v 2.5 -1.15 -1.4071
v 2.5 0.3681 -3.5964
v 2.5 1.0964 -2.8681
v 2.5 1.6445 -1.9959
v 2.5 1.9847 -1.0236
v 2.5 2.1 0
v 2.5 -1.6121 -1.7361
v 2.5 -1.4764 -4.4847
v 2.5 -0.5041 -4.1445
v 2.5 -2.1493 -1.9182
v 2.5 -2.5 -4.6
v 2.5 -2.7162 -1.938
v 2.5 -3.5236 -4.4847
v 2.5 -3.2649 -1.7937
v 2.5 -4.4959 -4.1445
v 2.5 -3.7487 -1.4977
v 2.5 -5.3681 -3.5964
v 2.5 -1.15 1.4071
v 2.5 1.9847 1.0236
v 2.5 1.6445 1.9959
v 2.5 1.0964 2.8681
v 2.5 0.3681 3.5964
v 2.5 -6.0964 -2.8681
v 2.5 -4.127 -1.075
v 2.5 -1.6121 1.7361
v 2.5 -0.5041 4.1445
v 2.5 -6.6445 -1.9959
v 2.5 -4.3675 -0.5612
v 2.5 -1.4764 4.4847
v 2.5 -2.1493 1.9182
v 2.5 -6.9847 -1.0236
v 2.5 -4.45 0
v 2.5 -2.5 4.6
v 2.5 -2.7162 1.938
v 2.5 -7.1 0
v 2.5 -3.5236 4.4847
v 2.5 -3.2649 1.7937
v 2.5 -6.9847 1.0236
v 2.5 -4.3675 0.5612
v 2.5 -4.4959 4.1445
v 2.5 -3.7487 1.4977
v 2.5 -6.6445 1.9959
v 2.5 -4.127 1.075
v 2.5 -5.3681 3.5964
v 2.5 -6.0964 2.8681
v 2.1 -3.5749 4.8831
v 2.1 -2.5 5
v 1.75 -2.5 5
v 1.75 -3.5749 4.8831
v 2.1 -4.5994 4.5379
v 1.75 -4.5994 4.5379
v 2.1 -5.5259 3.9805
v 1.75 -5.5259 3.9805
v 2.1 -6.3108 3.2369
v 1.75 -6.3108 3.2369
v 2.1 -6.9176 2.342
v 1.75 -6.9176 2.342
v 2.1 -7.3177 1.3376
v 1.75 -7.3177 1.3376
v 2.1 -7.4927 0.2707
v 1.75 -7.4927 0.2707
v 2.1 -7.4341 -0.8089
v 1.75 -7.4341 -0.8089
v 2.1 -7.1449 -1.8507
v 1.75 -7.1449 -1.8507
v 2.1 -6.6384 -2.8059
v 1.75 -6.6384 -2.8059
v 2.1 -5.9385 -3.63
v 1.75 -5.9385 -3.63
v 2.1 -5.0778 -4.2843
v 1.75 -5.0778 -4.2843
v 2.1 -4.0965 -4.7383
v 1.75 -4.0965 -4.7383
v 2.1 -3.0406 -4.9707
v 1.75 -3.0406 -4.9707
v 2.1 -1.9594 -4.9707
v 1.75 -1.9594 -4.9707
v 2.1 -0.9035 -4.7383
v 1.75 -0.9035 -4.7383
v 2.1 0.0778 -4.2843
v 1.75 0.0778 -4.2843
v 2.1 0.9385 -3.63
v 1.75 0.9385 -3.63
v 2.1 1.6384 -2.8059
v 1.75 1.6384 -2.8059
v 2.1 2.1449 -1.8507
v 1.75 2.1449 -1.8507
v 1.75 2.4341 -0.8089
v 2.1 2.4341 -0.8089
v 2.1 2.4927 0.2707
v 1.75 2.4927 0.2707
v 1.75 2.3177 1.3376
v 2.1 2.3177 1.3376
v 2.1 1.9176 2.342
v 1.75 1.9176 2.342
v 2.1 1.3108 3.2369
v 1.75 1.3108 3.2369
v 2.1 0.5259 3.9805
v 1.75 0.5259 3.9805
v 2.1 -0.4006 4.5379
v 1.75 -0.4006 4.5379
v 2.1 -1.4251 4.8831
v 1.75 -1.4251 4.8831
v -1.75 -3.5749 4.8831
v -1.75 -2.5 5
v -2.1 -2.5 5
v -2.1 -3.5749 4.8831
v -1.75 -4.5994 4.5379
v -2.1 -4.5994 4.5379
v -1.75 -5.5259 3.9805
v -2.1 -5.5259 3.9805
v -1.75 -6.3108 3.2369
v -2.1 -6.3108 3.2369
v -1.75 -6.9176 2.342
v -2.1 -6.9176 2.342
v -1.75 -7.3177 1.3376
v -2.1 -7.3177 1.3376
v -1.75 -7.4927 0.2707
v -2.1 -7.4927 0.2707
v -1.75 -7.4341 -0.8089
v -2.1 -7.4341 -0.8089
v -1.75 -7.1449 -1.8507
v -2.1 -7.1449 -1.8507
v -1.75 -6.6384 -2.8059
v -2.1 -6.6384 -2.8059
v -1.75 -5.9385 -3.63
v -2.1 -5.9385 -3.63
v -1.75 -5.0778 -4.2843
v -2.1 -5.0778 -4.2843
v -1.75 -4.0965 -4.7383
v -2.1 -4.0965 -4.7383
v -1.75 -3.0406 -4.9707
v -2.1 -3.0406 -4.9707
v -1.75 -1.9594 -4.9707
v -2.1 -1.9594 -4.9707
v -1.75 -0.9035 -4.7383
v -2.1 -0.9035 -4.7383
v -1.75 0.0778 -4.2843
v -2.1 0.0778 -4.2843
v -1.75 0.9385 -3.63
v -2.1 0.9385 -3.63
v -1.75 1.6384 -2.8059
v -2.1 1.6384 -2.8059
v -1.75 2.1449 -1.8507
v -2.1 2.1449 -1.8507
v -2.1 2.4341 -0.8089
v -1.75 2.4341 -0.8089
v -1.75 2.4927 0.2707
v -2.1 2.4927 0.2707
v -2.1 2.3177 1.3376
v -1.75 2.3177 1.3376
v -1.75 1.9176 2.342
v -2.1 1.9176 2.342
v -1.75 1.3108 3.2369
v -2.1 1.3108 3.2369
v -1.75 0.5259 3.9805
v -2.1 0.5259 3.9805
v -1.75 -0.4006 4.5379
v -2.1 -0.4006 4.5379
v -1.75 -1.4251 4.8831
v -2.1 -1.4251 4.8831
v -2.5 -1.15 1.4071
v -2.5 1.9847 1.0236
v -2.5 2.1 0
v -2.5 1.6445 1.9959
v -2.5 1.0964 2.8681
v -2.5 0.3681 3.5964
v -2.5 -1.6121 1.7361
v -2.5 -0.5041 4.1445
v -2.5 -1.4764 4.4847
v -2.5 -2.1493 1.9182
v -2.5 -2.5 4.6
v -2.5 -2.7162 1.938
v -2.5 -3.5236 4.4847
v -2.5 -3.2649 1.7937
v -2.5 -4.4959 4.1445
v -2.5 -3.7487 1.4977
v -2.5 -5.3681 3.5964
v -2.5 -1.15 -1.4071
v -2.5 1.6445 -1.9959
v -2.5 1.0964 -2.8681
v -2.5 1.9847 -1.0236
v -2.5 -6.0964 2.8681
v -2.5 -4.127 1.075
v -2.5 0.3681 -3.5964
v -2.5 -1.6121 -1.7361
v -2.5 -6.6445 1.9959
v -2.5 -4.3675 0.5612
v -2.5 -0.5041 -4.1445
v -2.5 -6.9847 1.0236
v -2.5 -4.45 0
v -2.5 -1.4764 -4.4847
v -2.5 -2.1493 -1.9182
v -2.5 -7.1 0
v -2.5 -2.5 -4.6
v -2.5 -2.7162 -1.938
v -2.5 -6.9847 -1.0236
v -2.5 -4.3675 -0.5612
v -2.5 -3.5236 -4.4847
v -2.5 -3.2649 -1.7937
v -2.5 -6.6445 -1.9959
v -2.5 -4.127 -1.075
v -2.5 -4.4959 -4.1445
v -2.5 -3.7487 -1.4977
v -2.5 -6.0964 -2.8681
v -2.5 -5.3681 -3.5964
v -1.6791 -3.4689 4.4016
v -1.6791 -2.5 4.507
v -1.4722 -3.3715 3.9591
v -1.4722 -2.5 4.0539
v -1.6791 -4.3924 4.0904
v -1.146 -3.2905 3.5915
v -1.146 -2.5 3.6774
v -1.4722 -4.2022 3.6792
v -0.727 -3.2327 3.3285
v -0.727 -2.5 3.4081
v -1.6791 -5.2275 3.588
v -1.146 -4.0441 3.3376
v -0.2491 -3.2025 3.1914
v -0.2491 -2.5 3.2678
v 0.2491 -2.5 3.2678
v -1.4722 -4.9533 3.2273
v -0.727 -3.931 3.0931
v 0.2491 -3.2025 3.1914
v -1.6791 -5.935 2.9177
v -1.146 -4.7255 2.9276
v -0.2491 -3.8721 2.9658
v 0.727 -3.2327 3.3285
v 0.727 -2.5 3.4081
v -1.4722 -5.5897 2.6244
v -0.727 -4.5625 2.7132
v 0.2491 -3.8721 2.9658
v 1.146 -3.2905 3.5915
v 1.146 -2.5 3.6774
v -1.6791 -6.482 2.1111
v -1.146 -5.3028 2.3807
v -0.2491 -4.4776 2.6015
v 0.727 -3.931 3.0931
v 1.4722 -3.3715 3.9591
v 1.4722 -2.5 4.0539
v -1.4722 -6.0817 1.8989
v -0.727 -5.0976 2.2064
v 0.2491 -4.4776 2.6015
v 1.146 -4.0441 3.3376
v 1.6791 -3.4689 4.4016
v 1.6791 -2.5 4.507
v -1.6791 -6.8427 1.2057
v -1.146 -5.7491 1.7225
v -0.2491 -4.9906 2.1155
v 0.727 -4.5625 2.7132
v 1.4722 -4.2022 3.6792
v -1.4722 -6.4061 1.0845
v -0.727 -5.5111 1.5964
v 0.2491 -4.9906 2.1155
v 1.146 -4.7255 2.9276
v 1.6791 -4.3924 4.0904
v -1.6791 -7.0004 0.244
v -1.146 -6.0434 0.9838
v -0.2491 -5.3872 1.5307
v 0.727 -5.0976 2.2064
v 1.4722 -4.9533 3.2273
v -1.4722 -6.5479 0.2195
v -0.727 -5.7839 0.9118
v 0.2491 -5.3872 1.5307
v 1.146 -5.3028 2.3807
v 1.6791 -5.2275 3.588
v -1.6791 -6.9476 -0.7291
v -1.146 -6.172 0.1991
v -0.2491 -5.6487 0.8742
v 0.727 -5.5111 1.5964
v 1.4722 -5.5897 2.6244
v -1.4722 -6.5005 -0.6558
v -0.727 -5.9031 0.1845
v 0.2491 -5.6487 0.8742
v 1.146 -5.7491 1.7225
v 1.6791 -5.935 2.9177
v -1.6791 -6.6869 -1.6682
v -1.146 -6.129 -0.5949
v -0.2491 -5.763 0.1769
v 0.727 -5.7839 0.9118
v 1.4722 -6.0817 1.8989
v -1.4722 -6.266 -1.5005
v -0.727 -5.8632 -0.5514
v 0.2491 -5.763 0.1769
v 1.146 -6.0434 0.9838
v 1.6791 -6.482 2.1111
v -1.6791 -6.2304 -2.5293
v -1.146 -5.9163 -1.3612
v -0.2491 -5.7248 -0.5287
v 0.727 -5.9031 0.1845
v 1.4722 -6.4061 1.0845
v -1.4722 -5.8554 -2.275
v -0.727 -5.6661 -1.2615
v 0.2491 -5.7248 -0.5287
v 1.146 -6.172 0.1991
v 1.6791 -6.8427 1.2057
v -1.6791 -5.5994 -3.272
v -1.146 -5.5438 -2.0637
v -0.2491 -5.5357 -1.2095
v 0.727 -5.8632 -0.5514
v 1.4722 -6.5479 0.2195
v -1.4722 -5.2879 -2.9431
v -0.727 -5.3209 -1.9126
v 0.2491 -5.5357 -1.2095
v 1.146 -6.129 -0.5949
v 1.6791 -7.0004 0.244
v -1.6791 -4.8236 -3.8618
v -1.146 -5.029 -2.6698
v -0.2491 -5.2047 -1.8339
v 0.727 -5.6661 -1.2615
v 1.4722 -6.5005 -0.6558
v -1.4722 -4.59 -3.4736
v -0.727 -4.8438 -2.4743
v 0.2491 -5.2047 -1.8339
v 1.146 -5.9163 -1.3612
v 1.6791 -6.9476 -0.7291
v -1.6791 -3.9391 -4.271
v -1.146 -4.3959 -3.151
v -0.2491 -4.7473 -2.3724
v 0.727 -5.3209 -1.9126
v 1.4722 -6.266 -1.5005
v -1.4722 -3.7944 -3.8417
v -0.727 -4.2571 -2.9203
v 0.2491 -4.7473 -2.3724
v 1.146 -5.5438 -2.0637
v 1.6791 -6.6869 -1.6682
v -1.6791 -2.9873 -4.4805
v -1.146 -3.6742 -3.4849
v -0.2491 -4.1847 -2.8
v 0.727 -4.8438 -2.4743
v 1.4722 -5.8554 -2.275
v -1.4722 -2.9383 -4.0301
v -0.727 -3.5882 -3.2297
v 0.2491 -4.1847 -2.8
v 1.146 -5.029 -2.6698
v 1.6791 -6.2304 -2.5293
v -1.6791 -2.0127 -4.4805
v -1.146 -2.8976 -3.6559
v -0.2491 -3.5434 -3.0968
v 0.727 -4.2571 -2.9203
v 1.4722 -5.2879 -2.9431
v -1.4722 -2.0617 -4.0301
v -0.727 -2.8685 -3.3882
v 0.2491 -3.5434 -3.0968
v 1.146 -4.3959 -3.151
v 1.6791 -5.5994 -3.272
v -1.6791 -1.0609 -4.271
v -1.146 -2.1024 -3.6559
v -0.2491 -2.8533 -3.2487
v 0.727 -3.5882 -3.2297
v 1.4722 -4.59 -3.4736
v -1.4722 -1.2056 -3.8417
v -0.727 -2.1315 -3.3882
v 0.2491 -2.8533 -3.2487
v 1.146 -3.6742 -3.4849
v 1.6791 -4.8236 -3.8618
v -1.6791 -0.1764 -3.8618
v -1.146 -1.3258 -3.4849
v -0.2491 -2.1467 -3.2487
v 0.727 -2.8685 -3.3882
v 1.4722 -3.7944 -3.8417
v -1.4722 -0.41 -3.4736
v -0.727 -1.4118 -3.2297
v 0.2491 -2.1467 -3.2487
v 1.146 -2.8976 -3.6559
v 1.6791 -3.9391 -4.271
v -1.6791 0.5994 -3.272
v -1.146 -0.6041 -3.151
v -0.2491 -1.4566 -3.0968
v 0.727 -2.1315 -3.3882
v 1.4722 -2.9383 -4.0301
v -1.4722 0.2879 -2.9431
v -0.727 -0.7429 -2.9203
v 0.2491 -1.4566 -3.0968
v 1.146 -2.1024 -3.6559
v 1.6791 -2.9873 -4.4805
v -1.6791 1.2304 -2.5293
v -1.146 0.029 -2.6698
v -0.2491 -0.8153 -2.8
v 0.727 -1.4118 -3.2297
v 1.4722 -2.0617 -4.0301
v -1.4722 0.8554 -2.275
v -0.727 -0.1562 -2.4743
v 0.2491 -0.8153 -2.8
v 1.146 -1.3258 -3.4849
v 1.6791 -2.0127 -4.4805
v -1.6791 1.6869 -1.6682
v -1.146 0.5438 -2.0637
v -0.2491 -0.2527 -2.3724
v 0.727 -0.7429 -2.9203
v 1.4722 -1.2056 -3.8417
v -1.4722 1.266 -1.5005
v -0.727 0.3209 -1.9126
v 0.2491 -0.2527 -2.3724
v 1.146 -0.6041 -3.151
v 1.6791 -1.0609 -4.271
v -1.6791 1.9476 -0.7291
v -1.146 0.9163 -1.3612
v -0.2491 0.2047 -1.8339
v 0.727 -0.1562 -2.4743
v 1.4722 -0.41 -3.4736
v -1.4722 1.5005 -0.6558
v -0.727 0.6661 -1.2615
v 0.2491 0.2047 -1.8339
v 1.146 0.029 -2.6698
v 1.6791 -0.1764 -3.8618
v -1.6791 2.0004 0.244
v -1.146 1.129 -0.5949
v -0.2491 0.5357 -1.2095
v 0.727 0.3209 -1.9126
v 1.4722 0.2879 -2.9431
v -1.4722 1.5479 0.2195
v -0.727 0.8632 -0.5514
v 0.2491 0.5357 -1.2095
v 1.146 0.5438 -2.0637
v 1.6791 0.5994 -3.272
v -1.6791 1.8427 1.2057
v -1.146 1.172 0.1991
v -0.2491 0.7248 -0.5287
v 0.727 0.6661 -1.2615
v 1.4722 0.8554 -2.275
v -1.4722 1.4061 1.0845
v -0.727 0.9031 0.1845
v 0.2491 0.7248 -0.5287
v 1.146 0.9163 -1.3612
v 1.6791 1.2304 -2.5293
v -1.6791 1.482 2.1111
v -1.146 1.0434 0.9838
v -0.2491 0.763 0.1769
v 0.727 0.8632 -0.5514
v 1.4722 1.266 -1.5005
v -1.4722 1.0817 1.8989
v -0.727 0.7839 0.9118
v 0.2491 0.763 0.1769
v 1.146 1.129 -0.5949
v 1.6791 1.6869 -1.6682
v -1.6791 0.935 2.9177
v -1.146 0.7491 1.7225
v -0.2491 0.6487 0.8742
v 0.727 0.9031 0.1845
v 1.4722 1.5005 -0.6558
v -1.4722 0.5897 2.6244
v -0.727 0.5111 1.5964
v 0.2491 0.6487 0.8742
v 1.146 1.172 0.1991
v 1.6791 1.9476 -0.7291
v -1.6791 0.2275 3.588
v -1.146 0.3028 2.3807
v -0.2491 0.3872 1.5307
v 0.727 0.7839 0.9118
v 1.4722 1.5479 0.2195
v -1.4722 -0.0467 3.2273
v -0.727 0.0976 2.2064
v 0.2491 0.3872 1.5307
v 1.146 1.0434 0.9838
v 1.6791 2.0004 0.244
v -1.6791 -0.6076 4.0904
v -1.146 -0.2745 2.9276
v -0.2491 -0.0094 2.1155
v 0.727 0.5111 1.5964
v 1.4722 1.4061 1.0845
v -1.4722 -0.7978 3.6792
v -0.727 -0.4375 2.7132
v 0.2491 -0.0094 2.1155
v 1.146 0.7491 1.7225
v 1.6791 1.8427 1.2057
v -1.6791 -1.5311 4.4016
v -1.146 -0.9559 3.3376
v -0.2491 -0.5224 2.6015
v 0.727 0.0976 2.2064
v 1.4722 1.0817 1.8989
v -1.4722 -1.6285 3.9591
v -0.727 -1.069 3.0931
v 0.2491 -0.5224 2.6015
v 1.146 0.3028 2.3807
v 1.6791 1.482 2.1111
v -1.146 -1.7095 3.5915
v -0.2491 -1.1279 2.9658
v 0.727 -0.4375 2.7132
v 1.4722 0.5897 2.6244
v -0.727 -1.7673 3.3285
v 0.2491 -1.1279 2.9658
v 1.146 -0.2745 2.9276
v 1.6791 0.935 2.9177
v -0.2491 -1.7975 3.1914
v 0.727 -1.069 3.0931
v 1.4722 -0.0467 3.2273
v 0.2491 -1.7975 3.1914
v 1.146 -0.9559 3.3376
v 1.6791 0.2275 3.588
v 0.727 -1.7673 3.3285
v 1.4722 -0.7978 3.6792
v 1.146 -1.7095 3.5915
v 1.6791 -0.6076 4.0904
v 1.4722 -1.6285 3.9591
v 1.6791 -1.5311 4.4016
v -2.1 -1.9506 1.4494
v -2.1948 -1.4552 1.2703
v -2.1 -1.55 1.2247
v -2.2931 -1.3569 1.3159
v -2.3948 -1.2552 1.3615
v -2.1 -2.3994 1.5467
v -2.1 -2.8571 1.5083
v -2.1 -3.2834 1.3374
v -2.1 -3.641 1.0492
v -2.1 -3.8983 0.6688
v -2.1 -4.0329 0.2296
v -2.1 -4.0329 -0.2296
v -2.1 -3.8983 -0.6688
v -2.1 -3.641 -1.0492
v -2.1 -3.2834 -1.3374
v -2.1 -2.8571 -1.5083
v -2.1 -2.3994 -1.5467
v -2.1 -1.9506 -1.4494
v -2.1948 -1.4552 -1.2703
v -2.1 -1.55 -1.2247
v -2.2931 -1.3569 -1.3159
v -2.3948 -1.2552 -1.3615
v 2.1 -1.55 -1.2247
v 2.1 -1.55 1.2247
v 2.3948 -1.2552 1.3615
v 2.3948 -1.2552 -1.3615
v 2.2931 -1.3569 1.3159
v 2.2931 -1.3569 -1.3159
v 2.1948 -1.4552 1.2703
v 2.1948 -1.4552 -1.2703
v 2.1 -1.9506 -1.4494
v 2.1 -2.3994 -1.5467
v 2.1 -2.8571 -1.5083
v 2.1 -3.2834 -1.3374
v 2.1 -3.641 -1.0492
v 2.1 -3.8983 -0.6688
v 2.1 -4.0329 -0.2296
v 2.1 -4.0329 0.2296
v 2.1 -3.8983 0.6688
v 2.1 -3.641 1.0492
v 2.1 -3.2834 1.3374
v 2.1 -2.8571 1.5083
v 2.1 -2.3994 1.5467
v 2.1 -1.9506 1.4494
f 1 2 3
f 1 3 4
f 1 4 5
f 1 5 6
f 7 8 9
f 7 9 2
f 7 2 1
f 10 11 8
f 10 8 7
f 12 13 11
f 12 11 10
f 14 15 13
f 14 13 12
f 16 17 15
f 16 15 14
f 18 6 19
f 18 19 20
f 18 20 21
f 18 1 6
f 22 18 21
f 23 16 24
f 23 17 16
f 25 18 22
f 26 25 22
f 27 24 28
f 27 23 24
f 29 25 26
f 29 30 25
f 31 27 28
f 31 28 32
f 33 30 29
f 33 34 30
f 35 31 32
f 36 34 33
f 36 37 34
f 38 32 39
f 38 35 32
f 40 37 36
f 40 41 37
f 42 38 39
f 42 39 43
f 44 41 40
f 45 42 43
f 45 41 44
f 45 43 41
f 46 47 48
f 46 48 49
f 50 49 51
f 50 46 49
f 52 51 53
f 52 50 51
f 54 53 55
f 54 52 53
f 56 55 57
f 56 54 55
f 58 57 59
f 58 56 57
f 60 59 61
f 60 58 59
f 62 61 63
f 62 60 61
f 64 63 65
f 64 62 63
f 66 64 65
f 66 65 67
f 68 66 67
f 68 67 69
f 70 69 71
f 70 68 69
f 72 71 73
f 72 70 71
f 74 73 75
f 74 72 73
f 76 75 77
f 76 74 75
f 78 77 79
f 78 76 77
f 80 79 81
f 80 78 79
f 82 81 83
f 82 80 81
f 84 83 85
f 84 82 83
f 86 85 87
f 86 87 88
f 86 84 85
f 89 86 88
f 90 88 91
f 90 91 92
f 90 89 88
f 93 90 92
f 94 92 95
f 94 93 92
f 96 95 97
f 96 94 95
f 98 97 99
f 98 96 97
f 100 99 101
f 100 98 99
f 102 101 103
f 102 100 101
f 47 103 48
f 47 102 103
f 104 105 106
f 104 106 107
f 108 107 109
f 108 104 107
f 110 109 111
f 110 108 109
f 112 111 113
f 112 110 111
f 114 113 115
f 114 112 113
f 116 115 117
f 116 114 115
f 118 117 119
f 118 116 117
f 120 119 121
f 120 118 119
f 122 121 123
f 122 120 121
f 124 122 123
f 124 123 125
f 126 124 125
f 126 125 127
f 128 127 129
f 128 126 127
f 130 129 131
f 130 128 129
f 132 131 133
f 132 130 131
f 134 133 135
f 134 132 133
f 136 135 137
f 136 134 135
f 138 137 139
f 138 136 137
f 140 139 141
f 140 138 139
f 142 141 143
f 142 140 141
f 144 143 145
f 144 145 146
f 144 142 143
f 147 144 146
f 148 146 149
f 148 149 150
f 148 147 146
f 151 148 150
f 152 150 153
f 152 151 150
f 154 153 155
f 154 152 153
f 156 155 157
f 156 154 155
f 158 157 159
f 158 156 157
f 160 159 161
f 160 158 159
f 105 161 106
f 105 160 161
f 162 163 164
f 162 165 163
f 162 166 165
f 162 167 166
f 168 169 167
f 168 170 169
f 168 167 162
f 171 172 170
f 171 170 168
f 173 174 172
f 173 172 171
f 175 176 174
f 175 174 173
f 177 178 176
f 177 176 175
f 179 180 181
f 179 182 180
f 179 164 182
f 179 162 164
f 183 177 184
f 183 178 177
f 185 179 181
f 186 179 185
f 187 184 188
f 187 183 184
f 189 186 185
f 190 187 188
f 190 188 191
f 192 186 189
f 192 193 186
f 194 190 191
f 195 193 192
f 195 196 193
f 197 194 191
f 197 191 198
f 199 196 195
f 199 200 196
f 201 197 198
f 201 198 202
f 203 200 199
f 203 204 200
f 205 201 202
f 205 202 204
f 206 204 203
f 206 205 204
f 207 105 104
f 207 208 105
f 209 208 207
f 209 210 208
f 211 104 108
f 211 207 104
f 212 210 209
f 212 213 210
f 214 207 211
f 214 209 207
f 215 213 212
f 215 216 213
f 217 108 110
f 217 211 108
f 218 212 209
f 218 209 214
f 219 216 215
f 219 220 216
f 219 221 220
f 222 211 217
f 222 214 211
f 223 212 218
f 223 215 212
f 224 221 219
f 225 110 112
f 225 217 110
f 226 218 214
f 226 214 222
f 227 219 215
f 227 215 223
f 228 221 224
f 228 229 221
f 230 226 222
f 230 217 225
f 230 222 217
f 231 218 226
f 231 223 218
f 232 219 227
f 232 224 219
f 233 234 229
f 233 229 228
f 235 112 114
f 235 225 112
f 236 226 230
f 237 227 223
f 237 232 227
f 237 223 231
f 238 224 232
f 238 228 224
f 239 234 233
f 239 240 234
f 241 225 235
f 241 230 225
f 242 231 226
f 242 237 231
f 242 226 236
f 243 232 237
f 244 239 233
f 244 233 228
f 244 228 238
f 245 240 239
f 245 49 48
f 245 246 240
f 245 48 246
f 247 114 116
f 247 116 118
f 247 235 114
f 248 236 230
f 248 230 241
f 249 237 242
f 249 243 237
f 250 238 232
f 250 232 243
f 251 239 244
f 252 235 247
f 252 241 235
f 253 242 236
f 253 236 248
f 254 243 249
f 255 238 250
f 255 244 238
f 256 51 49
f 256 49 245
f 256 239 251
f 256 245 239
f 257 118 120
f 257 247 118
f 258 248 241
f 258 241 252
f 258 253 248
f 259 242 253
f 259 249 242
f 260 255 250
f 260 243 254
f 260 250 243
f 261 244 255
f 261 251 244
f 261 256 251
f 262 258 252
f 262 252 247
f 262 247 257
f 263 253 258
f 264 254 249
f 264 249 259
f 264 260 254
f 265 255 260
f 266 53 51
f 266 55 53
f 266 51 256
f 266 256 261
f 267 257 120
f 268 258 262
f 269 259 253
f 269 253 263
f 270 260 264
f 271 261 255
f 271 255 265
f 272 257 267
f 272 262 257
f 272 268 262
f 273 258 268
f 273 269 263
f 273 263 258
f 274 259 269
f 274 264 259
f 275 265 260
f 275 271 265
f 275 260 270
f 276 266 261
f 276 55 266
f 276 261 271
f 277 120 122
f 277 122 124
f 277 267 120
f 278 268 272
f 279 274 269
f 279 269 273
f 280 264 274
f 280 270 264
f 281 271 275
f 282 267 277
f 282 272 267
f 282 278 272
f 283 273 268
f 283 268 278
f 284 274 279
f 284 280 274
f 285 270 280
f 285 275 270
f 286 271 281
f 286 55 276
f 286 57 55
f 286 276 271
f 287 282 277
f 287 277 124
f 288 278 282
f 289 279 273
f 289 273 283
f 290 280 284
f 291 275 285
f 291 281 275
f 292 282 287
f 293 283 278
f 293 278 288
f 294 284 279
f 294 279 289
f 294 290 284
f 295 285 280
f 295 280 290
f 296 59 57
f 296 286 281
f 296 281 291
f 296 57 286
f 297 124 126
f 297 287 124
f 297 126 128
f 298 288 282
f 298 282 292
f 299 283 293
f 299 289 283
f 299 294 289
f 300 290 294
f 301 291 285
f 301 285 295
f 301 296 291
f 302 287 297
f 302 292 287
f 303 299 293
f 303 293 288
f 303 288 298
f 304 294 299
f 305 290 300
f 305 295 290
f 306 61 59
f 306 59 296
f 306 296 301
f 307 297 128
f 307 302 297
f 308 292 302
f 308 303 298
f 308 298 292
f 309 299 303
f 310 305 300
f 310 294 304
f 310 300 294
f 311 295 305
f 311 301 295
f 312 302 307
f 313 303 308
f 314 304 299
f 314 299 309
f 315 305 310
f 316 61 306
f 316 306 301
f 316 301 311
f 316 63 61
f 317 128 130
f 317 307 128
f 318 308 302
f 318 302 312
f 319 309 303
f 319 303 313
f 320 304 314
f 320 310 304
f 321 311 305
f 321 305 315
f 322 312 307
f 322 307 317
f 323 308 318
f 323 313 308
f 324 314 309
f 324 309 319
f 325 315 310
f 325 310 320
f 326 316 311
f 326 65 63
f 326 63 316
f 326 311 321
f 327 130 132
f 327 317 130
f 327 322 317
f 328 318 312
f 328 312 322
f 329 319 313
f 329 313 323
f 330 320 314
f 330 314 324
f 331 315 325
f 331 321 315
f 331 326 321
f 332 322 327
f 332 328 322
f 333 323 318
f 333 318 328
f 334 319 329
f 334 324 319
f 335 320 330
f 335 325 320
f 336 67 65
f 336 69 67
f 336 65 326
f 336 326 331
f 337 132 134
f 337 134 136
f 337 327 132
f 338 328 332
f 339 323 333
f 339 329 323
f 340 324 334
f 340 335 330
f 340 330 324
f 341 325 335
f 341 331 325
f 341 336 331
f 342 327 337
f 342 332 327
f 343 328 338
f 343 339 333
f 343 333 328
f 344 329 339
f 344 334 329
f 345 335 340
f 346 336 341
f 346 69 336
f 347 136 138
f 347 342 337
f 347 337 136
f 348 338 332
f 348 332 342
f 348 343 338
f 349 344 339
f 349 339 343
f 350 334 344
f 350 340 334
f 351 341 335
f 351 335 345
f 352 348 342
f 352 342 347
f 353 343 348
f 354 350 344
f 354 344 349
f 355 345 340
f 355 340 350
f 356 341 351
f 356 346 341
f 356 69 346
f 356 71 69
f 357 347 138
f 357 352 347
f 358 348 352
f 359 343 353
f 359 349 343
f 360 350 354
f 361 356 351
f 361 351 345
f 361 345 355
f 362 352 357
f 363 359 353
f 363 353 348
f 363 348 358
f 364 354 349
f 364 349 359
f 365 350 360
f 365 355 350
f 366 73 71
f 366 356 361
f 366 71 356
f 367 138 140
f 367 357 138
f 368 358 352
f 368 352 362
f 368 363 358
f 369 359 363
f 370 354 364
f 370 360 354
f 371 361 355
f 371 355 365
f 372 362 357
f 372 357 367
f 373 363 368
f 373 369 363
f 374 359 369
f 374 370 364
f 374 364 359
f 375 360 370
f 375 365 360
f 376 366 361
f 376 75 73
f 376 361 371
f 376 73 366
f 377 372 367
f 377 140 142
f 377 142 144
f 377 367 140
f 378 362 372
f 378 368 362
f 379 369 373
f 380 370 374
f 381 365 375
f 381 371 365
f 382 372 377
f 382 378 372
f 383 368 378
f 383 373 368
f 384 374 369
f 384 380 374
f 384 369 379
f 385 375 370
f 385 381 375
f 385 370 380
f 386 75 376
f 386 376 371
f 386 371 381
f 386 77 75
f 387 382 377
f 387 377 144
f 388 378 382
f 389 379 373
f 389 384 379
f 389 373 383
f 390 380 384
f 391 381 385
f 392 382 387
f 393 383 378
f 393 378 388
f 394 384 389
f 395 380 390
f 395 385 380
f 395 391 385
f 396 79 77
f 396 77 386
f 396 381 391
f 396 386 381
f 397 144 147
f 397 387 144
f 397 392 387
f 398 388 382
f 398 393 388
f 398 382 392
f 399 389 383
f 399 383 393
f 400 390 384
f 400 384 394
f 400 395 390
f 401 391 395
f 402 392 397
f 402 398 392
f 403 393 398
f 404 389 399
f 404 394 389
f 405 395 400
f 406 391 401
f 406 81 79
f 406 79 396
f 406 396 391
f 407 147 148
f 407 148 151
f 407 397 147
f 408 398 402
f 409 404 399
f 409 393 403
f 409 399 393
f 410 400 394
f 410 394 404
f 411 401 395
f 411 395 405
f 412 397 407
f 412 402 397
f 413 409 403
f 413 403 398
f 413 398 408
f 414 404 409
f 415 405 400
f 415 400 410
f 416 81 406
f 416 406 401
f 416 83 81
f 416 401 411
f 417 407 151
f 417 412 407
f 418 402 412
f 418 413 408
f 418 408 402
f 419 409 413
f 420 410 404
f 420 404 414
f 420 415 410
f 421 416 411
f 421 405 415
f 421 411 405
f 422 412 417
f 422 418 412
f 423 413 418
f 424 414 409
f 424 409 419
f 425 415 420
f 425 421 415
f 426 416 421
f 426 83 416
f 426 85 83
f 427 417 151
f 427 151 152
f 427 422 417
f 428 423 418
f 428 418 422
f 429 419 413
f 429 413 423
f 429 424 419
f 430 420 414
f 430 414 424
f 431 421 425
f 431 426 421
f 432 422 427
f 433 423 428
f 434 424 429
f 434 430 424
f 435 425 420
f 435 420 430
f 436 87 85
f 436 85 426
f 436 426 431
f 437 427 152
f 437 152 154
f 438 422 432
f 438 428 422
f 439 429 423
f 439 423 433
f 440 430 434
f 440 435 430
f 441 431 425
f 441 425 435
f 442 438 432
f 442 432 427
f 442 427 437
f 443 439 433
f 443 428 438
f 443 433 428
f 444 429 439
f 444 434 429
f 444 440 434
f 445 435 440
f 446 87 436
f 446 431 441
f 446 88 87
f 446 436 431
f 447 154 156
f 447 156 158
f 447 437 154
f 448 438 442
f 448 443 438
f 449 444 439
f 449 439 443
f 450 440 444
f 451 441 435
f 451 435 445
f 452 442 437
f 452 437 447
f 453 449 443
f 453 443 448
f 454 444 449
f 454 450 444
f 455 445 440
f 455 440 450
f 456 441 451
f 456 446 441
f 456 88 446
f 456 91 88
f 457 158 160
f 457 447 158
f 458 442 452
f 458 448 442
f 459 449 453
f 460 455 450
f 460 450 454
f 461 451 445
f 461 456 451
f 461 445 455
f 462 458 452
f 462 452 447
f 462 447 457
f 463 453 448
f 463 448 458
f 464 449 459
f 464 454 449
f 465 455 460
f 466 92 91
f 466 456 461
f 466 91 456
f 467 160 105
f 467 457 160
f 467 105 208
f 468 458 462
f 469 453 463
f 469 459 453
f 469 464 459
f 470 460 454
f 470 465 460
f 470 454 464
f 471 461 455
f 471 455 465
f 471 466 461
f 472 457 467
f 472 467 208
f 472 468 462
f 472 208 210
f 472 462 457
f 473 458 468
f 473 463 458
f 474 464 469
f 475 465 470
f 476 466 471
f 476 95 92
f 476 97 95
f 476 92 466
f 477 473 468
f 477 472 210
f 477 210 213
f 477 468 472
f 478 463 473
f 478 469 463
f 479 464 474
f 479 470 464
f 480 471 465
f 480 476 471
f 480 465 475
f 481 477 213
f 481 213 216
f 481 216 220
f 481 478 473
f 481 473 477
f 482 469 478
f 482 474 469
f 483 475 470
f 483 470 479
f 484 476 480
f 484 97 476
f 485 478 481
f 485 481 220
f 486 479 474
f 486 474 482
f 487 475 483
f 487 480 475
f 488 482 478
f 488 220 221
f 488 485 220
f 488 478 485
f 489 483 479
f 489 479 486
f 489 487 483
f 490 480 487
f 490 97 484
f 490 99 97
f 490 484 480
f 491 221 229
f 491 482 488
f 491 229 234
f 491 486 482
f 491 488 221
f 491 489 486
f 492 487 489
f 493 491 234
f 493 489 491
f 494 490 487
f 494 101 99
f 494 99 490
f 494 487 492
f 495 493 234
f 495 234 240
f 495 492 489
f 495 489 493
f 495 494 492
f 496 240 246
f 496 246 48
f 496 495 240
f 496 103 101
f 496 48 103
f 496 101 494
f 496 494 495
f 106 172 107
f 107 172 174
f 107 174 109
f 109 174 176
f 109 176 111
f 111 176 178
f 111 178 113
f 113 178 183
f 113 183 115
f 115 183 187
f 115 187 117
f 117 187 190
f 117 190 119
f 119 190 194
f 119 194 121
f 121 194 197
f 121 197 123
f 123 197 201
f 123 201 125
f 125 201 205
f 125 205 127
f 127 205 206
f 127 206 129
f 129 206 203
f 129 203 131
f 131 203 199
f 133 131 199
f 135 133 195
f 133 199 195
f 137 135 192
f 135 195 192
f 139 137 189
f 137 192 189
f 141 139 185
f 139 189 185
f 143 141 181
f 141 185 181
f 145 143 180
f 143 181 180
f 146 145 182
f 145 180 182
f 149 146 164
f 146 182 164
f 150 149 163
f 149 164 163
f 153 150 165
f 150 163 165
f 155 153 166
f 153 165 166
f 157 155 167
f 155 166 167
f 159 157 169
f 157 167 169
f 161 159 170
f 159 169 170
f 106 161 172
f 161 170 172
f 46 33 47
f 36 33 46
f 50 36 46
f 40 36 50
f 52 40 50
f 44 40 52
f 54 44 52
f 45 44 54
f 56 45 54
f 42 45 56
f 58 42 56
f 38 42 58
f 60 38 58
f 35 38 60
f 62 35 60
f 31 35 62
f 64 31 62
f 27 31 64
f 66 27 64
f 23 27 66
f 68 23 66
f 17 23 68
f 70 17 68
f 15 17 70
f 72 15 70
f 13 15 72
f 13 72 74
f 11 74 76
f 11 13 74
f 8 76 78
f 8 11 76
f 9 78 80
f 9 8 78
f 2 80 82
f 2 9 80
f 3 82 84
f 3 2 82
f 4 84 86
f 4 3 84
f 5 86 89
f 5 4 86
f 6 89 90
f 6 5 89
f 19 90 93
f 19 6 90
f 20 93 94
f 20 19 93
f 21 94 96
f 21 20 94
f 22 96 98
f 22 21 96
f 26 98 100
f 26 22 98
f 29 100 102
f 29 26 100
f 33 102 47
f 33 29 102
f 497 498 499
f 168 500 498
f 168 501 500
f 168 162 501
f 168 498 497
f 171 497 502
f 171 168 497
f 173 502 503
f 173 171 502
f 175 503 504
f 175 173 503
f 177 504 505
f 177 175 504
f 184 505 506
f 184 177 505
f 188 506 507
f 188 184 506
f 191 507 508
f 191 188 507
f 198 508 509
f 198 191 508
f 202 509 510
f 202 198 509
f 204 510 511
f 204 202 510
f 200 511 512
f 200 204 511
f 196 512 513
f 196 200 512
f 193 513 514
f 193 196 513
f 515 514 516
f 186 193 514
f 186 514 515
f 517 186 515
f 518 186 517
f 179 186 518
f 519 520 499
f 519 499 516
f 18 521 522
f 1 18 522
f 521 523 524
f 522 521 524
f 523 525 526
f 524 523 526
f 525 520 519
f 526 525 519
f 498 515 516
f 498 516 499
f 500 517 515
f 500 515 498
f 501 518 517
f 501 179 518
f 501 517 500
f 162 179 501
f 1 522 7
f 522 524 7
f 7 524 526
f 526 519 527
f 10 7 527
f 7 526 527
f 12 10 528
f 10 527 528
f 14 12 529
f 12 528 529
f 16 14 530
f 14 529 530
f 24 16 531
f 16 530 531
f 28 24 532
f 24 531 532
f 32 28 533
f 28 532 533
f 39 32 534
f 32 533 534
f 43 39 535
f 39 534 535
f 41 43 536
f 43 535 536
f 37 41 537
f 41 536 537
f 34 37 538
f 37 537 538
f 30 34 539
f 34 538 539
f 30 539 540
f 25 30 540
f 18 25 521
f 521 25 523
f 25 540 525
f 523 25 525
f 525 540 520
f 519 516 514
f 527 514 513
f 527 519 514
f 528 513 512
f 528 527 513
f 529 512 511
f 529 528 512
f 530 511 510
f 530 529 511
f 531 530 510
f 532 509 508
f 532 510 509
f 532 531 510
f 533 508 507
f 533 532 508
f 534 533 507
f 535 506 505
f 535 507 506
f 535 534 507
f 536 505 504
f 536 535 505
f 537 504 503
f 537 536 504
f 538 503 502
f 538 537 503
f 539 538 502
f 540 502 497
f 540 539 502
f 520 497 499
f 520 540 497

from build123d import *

# Parameters (mm, degrees)
CUT_EXTRUDE1_DEPTH = 11.307764064
CHAMFER1_SIZE      = 0.4


with BuildPart() as part:
    # Sketch1 → Revolve1 (revolve)
    with BuildSketch(Plane.XY, mode=Mode.PRIVATE) as revolve1_sk:
        with BuildLine():
            Line((1.75, 2.5), (2.5, 2.5))
            Line((2.5, 2.5), (2.5, -2.5))
            Line((2.5, -2.5), (-2.5, -2.5))
            Line((-2.5, -2.5), (-2.5, 2.5))
            Line((-2.5, 2.5), (-1.75, 2.5))
            ThreePointArc((-1.75, 2.5), (0, 0.75), (1.75, 2.5))
        make_face()
    revolve(revolve1_sk.sketch.rotate(Axis((-2.5, -2.5, 0), (1, 0, 0)), 90), axis=Axis((-2.5, -2.5, 0), (1, 0, 0)))

    # Sketch2 → Cut-Extrude1 (cut, through all)
    with BuildSketch(Plane(origin=(2.5, 0, 0), x_dir=(0, 0, -1), z_dir=(1, 0, 0))):
        with BuildLine():
            Line((-1.224744871, -1.55), (1.224744871, -1.55))
            ThreePointArc((1.224744871, -1.55), (0, -4.05), (-1.224744871, -1.55))
        make_face()
    extrude(amount=-CUT_EXTRUDE1_DEPTH, mode=Mode.SUBTRACT)

    # Chamfer1
    chamfer1_edges = [part.edges().sort_by_distance(p)[0] for p in [
        (-2.5, -4.05, 0),
        (-2.5, -1.55, 0),
        (2.5, -4.05, 0),
        (2.5, -1.55, 0),
        (-2.5, -2.5, -5),
        (2.5, -2.5, -5),
    ]]
    chamfer(chamfer1_edges, length=CHAMFER1_SIZE)


solid = part.part
